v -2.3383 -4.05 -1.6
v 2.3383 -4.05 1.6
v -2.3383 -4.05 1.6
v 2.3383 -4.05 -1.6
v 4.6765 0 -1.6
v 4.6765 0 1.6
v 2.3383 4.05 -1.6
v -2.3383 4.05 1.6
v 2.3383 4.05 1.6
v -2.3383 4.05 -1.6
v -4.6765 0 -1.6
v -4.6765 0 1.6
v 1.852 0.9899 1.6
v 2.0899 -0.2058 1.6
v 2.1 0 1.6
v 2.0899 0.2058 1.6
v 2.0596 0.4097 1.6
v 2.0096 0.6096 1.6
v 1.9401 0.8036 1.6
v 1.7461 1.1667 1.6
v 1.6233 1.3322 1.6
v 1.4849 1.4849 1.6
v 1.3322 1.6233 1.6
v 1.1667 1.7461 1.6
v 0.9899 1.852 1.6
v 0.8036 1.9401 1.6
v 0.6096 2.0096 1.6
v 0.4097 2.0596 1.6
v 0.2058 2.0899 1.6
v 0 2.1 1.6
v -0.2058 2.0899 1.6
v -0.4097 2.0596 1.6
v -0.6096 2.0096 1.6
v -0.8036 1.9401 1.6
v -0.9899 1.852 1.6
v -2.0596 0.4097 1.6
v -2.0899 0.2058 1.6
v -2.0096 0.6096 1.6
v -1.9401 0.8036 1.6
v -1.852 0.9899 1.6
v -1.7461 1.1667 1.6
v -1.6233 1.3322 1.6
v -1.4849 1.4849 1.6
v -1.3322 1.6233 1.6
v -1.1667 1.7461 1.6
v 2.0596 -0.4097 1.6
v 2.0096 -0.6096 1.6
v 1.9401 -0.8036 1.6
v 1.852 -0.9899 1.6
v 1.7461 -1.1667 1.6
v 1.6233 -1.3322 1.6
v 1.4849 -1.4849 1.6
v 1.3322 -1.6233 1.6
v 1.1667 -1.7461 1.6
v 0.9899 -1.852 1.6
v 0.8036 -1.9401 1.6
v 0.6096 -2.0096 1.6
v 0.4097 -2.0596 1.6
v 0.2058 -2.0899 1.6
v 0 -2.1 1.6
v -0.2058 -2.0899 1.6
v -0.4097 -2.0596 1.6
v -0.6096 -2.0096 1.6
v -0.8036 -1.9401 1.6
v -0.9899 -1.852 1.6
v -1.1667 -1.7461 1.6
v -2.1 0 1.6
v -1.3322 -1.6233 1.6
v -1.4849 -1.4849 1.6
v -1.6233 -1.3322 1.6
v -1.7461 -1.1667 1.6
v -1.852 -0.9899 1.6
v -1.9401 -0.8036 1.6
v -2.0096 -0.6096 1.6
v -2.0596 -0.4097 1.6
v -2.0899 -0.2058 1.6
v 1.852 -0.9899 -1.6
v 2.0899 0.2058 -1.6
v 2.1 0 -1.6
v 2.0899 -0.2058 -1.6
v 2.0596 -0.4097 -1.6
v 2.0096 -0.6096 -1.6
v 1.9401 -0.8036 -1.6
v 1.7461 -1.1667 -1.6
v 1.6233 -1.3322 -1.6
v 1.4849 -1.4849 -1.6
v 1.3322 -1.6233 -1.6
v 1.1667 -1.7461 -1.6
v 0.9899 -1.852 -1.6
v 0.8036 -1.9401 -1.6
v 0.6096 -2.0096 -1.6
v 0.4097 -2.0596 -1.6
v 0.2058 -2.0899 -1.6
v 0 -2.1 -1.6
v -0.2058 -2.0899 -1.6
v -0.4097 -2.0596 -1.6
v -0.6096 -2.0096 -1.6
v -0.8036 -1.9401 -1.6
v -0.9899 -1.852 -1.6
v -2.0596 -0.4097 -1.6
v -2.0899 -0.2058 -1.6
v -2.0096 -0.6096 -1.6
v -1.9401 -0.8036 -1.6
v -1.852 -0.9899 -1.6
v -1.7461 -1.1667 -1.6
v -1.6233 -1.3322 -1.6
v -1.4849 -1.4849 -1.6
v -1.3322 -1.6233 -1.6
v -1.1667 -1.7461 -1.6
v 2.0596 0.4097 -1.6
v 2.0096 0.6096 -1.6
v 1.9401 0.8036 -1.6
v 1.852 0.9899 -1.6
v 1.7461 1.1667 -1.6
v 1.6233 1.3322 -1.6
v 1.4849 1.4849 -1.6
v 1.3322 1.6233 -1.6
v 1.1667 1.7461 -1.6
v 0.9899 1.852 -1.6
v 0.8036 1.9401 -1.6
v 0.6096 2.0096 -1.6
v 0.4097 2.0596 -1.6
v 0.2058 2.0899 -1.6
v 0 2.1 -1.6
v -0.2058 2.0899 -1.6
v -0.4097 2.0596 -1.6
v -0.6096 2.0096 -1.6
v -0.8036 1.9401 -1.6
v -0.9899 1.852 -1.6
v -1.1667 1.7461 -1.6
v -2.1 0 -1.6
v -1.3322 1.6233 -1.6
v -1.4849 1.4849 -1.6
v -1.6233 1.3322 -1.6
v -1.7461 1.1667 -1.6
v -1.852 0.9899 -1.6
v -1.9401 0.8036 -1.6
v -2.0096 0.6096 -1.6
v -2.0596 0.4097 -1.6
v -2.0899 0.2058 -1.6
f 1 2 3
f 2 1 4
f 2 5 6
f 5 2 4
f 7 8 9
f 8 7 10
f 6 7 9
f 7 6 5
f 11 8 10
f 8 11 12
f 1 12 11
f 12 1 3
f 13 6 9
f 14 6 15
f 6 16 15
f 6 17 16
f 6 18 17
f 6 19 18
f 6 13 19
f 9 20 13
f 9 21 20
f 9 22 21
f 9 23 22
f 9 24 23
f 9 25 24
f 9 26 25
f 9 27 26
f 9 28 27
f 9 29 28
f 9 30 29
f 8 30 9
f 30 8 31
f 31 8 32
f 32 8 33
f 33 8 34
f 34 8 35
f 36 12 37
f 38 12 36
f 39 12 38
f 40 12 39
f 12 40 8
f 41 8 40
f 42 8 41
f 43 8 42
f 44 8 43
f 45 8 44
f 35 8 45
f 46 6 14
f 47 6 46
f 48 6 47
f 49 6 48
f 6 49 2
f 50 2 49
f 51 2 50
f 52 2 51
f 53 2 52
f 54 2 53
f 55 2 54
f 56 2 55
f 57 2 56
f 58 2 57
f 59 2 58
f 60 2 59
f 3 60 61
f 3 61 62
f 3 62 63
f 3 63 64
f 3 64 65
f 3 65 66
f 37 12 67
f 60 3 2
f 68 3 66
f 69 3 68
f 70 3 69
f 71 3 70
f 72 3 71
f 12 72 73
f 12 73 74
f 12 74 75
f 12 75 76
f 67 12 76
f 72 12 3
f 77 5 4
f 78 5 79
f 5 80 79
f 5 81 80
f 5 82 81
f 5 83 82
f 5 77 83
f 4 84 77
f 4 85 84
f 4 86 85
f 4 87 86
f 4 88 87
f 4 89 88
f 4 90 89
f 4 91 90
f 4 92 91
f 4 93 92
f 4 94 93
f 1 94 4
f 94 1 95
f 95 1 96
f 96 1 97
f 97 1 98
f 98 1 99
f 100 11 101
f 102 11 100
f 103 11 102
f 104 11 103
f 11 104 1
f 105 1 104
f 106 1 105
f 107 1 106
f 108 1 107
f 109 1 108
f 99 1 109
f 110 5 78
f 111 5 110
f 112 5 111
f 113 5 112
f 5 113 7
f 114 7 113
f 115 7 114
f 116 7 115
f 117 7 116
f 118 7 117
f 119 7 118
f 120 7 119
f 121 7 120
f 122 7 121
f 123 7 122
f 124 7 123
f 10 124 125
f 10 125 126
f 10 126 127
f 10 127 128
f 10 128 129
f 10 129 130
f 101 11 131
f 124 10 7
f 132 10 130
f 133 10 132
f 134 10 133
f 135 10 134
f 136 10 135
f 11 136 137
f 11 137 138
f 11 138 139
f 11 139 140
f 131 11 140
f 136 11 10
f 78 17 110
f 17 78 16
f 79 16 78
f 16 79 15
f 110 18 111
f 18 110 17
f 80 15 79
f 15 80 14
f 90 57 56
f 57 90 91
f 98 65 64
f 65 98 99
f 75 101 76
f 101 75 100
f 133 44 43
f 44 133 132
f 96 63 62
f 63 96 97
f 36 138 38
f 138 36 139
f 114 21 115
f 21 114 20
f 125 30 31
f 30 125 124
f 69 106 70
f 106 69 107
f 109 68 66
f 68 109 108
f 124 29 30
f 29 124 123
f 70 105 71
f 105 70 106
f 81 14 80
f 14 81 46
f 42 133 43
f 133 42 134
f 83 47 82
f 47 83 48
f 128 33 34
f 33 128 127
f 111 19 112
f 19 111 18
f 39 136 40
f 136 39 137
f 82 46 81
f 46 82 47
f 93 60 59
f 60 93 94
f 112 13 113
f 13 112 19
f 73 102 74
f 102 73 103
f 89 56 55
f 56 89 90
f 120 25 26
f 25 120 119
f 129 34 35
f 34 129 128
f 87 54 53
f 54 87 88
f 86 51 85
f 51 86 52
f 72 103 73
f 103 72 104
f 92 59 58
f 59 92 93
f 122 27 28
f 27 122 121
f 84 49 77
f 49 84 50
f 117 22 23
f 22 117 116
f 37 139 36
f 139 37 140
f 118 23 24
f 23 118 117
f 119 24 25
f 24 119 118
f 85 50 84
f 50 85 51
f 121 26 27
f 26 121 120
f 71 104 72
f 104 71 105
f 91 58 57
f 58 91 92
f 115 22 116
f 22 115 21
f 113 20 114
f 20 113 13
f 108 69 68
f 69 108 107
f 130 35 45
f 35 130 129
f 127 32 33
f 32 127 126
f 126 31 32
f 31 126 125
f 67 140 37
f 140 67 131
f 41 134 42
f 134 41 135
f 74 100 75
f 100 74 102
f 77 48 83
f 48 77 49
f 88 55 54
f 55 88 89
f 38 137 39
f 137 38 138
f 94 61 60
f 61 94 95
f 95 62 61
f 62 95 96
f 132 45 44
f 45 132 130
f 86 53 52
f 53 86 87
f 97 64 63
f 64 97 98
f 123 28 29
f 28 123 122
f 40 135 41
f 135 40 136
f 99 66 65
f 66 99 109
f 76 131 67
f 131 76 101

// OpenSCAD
$fn=64;

nut_thickness = 3.2;
across_flats = 8.1;
hole_diameter = 4.0;
clearance = 0.2;

module hex_prism(af, h){
    r = af / sqrt(3);
    cylinder(h=h, r=r, center=true, $fn=6);
}

module nut(af, h, hole_d){
    difference(){
        hex_prism(af, h);
        cylinder(h=h+0.6, d=hole_d+clearance, center=true, $fn=64);
    }
}

nut(across_flats, nut_thickness, hole_diameter);
